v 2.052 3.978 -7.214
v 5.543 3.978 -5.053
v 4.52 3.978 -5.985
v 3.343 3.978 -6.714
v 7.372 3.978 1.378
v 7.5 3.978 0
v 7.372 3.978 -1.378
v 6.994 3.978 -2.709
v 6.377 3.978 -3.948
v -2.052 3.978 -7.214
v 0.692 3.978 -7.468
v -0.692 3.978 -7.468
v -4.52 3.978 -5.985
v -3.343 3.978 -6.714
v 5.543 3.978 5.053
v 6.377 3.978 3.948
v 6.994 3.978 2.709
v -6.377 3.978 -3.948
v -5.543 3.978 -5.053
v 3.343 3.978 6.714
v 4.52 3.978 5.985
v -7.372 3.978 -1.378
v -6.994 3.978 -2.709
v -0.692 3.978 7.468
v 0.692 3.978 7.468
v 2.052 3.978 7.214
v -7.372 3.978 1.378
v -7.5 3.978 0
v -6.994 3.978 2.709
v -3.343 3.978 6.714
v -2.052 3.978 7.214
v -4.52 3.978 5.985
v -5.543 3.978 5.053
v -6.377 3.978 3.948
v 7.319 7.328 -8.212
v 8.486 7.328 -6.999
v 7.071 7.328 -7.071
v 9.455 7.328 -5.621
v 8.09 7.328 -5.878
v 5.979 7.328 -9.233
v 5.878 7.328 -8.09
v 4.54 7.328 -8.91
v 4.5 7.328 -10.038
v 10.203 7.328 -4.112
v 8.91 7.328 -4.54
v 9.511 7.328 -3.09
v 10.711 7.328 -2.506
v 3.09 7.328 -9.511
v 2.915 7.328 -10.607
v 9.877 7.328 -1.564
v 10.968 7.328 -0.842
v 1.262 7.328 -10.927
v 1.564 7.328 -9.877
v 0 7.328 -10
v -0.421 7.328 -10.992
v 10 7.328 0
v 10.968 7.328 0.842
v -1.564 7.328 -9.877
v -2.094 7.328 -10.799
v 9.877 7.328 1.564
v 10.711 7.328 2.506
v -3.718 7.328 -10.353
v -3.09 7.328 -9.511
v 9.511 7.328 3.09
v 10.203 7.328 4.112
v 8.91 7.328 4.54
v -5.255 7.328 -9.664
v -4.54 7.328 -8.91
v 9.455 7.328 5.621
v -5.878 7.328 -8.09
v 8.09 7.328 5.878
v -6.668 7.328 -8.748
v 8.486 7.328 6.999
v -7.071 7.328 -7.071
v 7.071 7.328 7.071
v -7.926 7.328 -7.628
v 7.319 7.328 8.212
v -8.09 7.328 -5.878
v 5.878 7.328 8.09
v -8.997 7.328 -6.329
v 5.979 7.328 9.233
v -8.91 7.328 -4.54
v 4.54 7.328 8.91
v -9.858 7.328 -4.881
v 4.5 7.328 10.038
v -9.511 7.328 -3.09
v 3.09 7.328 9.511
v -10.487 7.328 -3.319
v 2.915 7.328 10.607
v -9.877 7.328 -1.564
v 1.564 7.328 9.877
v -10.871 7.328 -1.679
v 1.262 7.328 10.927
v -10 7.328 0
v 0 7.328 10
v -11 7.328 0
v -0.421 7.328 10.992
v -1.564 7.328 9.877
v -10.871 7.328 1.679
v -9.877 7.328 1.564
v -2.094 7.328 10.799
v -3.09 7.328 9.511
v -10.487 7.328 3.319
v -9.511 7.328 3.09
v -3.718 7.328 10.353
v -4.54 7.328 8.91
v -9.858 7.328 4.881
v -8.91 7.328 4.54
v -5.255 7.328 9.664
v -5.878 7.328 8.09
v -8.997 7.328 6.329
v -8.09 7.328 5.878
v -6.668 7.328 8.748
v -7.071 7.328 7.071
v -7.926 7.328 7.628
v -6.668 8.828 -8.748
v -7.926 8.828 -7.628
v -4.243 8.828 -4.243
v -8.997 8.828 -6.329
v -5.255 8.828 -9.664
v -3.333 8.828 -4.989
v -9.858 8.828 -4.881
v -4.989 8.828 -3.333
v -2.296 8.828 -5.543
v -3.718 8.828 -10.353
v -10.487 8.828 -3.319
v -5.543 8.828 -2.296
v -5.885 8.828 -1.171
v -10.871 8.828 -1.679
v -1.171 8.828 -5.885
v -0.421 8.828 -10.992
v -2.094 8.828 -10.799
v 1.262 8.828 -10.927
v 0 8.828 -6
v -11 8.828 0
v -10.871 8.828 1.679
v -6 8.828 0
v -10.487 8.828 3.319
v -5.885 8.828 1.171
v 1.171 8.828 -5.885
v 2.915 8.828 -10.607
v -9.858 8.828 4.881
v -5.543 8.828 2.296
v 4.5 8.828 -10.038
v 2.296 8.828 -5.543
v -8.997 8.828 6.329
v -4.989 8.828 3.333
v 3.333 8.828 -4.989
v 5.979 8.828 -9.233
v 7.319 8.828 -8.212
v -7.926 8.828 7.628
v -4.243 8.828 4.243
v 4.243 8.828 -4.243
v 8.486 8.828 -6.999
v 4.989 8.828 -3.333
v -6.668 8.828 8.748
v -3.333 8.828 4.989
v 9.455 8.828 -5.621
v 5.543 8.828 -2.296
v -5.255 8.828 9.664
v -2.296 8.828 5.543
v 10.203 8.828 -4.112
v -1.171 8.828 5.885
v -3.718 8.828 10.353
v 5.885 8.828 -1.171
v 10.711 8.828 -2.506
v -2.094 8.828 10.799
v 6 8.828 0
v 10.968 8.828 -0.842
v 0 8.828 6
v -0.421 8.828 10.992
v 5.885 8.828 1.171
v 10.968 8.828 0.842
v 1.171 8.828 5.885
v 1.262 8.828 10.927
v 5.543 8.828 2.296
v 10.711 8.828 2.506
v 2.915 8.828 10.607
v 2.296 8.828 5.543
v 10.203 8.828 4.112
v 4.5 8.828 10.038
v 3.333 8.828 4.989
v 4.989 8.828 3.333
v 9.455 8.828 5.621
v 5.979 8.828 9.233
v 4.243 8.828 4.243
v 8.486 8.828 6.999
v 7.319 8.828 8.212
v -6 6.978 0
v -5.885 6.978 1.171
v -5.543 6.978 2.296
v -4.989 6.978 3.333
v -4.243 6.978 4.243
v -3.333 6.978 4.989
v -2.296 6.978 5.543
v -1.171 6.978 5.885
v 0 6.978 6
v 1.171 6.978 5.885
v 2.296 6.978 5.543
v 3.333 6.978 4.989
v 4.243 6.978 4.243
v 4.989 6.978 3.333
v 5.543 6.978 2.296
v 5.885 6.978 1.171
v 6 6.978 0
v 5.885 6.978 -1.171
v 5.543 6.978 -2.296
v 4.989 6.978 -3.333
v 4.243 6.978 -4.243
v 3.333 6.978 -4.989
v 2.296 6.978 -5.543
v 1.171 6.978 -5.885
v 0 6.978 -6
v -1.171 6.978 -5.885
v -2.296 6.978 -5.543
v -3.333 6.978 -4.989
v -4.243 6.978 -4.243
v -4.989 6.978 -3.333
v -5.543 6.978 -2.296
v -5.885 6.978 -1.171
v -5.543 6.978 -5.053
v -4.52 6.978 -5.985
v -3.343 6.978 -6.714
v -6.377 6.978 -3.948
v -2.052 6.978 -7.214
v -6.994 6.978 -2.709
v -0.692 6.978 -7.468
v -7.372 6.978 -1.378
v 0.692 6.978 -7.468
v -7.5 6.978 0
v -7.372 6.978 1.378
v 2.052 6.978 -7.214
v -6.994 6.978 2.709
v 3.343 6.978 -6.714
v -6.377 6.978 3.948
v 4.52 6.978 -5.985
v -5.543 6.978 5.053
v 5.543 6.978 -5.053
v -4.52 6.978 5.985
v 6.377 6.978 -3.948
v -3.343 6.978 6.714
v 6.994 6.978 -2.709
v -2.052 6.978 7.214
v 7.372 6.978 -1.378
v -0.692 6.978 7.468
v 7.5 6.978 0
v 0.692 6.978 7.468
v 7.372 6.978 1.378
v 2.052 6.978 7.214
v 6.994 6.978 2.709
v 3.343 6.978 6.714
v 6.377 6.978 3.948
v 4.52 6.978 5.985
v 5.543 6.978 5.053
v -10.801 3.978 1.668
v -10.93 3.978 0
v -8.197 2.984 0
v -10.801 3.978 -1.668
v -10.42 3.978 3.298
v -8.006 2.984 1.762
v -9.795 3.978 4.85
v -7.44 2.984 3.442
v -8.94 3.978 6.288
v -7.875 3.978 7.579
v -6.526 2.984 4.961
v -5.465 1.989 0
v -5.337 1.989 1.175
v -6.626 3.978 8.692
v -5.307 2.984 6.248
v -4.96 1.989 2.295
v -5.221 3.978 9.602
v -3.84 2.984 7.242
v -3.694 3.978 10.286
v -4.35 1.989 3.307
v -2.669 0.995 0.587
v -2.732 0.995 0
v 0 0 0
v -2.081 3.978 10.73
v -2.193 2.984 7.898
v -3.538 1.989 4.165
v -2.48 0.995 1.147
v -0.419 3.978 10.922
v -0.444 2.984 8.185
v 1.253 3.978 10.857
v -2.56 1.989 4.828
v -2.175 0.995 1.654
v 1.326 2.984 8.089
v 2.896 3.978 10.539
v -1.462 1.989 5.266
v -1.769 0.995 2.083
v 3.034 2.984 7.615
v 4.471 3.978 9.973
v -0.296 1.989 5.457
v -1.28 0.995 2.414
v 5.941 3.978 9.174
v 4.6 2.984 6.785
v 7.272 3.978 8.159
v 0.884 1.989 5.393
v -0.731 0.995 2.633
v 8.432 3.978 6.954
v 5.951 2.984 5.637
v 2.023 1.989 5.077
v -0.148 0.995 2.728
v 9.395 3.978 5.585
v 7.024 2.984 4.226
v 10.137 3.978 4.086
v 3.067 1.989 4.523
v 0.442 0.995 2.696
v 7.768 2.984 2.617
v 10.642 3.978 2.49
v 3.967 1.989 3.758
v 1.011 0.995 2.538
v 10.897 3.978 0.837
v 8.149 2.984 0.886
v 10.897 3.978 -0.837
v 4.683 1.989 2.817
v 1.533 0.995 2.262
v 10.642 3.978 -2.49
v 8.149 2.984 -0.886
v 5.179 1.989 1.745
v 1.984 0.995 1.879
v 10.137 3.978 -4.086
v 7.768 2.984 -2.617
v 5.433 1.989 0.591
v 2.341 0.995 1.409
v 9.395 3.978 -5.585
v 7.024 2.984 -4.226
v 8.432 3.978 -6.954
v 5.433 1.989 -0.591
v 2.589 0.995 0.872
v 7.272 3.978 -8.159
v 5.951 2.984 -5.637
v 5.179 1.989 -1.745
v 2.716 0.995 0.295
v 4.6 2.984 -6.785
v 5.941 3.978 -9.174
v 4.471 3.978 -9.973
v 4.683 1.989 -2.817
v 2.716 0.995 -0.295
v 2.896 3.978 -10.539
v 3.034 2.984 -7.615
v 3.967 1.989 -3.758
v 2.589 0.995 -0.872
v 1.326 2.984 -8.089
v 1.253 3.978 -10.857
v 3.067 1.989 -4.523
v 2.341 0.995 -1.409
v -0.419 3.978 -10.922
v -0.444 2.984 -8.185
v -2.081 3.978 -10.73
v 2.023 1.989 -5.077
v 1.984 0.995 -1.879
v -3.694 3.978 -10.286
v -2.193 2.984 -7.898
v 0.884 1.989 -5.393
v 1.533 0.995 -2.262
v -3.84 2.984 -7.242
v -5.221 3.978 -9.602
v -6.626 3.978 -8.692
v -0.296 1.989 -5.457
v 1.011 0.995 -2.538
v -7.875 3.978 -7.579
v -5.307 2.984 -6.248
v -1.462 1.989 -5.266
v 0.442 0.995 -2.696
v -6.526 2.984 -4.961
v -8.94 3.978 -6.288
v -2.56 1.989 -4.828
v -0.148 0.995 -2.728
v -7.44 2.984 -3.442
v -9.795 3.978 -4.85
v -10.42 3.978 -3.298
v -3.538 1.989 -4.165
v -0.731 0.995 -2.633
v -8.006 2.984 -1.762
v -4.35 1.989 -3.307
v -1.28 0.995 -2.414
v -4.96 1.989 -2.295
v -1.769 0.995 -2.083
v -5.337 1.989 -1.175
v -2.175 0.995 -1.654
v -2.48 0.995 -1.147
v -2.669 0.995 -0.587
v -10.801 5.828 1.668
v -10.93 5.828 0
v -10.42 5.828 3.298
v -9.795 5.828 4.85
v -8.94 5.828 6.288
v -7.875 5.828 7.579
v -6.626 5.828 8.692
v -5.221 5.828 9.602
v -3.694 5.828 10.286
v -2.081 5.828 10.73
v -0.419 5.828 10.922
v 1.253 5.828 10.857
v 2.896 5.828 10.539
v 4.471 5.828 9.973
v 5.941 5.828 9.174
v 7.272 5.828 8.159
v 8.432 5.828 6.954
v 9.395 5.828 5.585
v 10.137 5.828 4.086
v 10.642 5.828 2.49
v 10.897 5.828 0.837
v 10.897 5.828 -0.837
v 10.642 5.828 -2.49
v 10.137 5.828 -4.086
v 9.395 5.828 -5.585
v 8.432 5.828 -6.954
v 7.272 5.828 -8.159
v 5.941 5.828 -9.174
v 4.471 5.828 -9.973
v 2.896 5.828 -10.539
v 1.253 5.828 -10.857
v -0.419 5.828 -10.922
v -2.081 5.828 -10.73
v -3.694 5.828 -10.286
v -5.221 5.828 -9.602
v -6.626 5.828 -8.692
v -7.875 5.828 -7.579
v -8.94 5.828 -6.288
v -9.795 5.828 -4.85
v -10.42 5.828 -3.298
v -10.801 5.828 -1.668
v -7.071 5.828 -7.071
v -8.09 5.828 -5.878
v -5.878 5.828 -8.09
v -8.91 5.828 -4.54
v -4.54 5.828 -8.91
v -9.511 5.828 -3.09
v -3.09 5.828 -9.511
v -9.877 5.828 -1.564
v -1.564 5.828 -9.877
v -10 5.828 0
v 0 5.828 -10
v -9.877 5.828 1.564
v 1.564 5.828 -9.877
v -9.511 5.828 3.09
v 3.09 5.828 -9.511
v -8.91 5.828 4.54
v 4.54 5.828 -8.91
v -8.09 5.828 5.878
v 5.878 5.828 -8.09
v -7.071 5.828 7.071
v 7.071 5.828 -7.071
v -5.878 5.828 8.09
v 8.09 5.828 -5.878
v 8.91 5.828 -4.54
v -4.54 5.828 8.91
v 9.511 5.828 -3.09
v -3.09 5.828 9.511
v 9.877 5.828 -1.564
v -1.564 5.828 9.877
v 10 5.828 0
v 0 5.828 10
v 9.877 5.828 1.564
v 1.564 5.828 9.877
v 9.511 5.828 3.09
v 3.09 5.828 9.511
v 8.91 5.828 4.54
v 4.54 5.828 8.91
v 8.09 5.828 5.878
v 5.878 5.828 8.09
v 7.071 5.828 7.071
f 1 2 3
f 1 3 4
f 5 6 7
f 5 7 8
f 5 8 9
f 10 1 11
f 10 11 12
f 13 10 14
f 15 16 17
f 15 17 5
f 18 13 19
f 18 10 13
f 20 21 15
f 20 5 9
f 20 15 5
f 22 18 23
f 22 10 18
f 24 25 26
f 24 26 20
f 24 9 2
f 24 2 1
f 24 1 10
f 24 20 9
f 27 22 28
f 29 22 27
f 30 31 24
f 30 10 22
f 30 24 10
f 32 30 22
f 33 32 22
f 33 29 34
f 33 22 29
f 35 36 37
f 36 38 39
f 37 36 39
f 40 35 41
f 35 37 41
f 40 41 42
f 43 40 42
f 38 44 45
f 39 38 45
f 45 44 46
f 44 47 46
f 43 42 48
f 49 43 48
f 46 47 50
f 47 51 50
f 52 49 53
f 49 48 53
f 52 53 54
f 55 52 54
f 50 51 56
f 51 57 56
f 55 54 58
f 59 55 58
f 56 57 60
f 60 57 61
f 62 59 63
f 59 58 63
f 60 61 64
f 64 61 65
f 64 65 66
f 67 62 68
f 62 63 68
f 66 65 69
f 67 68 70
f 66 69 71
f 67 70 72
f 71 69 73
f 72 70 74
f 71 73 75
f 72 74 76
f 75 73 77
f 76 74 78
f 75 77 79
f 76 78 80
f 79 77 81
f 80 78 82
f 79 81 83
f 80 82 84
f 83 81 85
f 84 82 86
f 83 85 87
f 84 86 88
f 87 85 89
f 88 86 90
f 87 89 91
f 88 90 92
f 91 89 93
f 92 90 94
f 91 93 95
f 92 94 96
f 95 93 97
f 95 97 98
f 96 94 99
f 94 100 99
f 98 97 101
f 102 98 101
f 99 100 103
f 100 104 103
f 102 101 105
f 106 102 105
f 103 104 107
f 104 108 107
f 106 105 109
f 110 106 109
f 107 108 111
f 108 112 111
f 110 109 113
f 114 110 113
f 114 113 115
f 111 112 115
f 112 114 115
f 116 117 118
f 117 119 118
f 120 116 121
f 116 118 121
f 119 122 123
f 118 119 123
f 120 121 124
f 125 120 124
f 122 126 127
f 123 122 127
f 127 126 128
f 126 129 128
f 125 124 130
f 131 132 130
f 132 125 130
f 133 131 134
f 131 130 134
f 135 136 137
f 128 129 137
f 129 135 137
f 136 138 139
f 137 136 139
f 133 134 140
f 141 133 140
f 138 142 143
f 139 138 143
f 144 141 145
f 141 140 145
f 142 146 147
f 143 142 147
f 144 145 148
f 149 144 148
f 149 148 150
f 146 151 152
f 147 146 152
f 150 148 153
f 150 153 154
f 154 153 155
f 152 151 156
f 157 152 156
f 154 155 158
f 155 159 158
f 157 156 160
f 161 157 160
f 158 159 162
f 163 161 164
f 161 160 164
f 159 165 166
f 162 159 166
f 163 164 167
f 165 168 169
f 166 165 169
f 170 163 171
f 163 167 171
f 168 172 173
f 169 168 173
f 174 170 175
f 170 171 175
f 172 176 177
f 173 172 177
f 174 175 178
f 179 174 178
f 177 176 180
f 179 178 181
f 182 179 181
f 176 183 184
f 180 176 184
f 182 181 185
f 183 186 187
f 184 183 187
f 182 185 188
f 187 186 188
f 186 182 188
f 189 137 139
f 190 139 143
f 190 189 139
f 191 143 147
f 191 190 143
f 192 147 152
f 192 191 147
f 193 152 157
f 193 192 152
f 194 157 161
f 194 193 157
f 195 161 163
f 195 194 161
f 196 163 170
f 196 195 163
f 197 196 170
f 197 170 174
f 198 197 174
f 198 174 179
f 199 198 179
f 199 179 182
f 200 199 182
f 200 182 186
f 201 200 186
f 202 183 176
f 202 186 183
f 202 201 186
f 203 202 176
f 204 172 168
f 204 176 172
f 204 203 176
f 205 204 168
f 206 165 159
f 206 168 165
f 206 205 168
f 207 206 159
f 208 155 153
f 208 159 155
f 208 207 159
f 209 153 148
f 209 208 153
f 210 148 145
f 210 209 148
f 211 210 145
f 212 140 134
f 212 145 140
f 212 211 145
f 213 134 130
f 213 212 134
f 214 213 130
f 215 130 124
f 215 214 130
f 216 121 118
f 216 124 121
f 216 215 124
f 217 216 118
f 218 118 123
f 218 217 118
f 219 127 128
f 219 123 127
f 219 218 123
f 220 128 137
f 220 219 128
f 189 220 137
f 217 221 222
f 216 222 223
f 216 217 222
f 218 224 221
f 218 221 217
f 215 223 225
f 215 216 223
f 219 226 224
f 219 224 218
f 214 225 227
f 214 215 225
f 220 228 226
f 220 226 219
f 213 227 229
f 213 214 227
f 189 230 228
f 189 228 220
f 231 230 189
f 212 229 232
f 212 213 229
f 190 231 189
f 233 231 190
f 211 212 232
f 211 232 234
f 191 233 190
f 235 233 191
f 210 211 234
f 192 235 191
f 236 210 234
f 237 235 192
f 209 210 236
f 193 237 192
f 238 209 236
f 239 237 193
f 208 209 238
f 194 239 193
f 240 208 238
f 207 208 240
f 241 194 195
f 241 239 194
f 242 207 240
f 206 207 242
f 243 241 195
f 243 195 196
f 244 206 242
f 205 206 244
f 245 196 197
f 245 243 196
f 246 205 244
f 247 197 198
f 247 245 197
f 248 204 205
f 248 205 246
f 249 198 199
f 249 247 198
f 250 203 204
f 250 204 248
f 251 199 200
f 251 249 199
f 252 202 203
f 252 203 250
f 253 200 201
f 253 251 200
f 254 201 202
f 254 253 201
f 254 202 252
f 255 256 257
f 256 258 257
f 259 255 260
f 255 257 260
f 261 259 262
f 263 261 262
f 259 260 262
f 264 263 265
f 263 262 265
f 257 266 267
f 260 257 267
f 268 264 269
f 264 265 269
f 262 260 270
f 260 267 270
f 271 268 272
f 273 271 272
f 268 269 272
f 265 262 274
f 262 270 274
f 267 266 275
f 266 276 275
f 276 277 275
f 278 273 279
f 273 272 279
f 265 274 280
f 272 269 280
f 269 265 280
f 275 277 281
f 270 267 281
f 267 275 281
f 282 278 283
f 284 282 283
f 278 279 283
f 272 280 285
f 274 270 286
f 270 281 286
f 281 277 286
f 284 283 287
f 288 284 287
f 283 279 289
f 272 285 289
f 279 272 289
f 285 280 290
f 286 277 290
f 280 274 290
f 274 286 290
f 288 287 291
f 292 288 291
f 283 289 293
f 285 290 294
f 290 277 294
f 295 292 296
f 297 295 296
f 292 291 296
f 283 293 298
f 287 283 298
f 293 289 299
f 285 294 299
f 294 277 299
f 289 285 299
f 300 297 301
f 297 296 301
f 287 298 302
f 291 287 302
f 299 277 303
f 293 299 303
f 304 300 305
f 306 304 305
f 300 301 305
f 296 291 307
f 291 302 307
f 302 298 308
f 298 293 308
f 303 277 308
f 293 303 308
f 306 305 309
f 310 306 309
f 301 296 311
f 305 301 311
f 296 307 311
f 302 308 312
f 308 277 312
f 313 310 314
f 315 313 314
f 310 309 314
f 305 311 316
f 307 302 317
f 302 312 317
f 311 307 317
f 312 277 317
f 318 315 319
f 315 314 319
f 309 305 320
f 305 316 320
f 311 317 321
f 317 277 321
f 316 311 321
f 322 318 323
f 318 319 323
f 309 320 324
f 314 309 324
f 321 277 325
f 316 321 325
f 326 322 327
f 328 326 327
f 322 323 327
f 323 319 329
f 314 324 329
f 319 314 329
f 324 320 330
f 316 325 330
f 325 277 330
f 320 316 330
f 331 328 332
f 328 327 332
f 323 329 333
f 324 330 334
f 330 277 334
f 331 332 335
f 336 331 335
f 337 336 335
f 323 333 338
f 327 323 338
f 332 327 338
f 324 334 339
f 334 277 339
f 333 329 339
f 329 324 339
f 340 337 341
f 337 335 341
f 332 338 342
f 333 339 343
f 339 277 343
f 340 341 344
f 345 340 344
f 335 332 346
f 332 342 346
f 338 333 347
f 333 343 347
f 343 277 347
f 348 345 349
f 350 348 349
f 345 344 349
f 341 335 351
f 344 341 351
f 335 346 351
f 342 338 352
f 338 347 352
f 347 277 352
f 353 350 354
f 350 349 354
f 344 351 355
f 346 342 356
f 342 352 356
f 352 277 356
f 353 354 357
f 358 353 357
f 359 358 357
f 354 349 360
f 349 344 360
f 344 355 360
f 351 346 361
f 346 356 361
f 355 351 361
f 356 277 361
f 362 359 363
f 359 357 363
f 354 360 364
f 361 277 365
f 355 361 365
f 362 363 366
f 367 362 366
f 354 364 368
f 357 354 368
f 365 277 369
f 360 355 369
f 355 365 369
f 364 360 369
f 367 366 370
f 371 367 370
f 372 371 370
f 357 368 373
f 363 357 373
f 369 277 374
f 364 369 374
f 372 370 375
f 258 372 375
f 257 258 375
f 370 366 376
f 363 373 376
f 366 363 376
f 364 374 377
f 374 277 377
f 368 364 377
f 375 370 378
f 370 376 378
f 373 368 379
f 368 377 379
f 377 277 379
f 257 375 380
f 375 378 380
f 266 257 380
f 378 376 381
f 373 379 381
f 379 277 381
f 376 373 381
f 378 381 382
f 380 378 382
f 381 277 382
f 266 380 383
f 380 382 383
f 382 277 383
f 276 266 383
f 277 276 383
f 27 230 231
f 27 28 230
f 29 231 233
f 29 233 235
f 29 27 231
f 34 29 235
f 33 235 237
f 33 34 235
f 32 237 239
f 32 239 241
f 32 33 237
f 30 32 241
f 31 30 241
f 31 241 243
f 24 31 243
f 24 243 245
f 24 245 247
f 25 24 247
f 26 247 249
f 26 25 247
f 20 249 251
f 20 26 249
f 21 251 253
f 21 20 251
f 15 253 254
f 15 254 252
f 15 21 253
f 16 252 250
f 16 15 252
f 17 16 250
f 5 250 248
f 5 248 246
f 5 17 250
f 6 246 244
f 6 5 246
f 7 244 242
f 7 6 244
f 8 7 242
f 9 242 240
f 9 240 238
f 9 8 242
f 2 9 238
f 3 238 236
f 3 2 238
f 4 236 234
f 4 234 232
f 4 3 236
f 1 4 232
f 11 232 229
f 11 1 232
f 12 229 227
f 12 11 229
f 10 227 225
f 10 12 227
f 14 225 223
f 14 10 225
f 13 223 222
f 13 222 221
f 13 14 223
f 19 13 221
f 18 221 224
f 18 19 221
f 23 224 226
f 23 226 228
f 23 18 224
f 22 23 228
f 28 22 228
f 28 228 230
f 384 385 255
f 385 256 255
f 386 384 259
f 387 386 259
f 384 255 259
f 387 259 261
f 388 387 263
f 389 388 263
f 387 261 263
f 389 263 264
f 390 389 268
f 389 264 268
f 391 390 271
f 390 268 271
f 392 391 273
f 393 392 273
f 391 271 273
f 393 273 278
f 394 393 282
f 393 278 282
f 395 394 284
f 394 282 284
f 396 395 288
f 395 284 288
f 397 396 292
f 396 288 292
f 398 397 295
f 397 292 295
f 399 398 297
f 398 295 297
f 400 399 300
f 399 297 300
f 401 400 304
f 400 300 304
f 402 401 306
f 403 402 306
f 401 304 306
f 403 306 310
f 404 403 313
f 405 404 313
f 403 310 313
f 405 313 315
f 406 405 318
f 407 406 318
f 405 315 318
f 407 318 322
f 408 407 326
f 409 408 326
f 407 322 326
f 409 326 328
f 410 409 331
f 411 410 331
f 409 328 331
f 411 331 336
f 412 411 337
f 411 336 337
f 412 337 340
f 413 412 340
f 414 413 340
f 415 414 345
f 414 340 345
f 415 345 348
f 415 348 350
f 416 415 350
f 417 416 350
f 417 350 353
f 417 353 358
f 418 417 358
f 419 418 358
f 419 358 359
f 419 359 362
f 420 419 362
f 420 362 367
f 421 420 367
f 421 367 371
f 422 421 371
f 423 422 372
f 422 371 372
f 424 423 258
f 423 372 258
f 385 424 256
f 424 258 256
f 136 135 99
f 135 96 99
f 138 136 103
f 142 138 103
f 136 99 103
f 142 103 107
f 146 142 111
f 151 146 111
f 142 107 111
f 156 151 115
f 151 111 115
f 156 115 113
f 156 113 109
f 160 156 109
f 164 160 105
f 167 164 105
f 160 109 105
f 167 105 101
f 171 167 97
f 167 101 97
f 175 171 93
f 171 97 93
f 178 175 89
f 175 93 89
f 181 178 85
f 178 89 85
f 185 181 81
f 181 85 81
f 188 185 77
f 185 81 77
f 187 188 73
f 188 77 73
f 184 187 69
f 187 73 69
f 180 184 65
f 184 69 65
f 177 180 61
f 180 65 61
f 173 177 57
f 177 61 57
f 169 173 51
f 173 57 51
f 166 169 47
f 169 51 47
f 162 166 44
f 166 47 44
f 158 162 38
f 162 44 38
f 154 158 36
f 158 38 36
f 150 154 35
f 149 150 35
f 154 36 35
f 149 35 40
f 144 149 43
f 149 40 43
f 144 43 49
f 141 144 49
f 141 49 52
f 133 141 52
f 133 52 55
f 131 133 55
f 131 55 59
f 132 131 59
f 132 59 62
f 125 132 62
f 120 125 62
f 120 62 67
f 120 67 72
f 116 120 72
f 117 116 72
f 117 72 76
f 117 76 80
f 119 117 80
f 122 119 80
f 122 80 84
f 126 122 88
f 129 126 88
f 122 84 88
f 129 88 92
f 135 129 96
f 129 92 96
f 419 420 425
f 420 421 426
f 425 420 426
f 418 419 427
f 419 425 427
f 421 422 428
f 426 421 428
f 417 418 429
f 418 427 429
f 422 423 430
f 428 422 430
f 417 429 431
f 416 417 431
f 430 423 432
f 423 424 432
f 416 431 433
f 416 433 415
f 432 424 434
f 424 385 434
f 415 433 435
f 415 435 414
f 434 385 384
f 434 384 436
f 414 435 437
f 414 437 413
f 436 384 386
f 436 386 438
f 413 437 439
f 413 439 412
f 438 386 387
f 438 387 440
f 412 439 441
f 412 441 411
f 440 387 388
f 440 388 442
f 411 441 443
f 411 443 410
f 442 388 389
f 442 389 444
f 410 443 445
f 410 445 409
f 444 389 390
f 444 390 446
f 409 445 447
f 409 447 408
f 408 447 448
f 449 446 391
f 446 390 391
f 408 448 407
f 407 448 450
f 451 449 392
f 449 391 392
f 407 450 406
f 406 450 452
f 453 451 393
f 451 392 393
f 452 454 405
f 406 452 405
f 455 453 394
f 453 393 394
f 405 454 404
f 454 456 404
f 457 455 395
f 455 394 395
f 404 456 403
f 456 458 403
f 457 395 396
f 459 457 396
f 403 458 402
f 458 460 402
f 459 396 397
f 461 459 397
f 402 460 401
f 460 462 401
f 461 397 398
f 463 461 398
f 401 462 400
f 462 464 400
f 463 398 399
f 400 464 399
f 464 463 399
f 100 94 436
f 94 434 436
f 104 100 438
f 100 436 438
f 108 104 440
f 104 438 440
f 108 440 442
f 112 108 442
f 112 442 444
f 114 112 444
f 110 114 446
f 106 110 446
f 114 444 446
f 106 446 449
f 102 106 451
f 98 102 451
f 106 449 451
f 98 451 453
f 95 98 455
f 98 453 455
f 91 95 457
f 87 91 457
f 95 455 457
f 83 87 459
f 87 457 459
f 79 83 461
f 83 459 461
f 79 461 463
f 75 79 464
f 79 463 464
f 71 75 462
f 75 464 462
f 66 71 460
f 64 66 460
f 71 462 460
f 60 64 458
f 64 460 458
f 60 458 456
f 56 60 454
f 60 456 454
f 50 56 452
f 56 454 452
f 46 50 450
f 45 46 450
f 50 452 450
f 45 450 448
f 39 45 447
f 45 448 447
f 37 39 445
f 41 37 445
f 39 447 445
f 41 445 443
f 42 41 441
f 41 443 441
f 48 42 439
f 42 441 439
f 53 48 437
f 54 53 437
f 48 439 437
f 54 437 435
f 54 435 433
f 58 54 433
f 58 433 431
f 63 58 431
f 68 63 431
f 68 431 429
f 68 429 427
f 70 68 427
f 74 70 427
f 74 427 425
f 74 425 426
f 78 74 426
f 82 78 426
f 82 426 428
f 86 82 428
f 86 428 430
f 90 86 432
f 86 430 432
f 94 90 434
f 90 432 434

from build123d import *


with BuildPart() as part:
    # Sketch1 → Revolve1 (revolve)
    with BuildSketch(Plane.XY):
        Polygon((0, 0), (0, 8.828029189), (-11, 8.828029189), (-11, 7.328029189), (-10, 7.328029189), (-10, 5.828029189), (-10.929545371, 5.828029189), (-10.929545371, 3.978029189), align=None)
    revolve(axis=Axis((0, 0, 0), (0, 1, 0)))

    # Sketch2 → Cut-Revolve1 (revolve, cut)
    with BuildSketch(Plane.XY):
        Polygon((0, 3.978029189), (0, 9.978029189), (-6, 9.978029189), (-6, 6.978029189), (-7.5, 6.978029189), (-7.5, 3.978029189), align=None)
    revolve(axis=Axis((0, 3.978029189, 0), (0, 1, 0)), mode=Mode.SUBTRACT)


solid = part.part
